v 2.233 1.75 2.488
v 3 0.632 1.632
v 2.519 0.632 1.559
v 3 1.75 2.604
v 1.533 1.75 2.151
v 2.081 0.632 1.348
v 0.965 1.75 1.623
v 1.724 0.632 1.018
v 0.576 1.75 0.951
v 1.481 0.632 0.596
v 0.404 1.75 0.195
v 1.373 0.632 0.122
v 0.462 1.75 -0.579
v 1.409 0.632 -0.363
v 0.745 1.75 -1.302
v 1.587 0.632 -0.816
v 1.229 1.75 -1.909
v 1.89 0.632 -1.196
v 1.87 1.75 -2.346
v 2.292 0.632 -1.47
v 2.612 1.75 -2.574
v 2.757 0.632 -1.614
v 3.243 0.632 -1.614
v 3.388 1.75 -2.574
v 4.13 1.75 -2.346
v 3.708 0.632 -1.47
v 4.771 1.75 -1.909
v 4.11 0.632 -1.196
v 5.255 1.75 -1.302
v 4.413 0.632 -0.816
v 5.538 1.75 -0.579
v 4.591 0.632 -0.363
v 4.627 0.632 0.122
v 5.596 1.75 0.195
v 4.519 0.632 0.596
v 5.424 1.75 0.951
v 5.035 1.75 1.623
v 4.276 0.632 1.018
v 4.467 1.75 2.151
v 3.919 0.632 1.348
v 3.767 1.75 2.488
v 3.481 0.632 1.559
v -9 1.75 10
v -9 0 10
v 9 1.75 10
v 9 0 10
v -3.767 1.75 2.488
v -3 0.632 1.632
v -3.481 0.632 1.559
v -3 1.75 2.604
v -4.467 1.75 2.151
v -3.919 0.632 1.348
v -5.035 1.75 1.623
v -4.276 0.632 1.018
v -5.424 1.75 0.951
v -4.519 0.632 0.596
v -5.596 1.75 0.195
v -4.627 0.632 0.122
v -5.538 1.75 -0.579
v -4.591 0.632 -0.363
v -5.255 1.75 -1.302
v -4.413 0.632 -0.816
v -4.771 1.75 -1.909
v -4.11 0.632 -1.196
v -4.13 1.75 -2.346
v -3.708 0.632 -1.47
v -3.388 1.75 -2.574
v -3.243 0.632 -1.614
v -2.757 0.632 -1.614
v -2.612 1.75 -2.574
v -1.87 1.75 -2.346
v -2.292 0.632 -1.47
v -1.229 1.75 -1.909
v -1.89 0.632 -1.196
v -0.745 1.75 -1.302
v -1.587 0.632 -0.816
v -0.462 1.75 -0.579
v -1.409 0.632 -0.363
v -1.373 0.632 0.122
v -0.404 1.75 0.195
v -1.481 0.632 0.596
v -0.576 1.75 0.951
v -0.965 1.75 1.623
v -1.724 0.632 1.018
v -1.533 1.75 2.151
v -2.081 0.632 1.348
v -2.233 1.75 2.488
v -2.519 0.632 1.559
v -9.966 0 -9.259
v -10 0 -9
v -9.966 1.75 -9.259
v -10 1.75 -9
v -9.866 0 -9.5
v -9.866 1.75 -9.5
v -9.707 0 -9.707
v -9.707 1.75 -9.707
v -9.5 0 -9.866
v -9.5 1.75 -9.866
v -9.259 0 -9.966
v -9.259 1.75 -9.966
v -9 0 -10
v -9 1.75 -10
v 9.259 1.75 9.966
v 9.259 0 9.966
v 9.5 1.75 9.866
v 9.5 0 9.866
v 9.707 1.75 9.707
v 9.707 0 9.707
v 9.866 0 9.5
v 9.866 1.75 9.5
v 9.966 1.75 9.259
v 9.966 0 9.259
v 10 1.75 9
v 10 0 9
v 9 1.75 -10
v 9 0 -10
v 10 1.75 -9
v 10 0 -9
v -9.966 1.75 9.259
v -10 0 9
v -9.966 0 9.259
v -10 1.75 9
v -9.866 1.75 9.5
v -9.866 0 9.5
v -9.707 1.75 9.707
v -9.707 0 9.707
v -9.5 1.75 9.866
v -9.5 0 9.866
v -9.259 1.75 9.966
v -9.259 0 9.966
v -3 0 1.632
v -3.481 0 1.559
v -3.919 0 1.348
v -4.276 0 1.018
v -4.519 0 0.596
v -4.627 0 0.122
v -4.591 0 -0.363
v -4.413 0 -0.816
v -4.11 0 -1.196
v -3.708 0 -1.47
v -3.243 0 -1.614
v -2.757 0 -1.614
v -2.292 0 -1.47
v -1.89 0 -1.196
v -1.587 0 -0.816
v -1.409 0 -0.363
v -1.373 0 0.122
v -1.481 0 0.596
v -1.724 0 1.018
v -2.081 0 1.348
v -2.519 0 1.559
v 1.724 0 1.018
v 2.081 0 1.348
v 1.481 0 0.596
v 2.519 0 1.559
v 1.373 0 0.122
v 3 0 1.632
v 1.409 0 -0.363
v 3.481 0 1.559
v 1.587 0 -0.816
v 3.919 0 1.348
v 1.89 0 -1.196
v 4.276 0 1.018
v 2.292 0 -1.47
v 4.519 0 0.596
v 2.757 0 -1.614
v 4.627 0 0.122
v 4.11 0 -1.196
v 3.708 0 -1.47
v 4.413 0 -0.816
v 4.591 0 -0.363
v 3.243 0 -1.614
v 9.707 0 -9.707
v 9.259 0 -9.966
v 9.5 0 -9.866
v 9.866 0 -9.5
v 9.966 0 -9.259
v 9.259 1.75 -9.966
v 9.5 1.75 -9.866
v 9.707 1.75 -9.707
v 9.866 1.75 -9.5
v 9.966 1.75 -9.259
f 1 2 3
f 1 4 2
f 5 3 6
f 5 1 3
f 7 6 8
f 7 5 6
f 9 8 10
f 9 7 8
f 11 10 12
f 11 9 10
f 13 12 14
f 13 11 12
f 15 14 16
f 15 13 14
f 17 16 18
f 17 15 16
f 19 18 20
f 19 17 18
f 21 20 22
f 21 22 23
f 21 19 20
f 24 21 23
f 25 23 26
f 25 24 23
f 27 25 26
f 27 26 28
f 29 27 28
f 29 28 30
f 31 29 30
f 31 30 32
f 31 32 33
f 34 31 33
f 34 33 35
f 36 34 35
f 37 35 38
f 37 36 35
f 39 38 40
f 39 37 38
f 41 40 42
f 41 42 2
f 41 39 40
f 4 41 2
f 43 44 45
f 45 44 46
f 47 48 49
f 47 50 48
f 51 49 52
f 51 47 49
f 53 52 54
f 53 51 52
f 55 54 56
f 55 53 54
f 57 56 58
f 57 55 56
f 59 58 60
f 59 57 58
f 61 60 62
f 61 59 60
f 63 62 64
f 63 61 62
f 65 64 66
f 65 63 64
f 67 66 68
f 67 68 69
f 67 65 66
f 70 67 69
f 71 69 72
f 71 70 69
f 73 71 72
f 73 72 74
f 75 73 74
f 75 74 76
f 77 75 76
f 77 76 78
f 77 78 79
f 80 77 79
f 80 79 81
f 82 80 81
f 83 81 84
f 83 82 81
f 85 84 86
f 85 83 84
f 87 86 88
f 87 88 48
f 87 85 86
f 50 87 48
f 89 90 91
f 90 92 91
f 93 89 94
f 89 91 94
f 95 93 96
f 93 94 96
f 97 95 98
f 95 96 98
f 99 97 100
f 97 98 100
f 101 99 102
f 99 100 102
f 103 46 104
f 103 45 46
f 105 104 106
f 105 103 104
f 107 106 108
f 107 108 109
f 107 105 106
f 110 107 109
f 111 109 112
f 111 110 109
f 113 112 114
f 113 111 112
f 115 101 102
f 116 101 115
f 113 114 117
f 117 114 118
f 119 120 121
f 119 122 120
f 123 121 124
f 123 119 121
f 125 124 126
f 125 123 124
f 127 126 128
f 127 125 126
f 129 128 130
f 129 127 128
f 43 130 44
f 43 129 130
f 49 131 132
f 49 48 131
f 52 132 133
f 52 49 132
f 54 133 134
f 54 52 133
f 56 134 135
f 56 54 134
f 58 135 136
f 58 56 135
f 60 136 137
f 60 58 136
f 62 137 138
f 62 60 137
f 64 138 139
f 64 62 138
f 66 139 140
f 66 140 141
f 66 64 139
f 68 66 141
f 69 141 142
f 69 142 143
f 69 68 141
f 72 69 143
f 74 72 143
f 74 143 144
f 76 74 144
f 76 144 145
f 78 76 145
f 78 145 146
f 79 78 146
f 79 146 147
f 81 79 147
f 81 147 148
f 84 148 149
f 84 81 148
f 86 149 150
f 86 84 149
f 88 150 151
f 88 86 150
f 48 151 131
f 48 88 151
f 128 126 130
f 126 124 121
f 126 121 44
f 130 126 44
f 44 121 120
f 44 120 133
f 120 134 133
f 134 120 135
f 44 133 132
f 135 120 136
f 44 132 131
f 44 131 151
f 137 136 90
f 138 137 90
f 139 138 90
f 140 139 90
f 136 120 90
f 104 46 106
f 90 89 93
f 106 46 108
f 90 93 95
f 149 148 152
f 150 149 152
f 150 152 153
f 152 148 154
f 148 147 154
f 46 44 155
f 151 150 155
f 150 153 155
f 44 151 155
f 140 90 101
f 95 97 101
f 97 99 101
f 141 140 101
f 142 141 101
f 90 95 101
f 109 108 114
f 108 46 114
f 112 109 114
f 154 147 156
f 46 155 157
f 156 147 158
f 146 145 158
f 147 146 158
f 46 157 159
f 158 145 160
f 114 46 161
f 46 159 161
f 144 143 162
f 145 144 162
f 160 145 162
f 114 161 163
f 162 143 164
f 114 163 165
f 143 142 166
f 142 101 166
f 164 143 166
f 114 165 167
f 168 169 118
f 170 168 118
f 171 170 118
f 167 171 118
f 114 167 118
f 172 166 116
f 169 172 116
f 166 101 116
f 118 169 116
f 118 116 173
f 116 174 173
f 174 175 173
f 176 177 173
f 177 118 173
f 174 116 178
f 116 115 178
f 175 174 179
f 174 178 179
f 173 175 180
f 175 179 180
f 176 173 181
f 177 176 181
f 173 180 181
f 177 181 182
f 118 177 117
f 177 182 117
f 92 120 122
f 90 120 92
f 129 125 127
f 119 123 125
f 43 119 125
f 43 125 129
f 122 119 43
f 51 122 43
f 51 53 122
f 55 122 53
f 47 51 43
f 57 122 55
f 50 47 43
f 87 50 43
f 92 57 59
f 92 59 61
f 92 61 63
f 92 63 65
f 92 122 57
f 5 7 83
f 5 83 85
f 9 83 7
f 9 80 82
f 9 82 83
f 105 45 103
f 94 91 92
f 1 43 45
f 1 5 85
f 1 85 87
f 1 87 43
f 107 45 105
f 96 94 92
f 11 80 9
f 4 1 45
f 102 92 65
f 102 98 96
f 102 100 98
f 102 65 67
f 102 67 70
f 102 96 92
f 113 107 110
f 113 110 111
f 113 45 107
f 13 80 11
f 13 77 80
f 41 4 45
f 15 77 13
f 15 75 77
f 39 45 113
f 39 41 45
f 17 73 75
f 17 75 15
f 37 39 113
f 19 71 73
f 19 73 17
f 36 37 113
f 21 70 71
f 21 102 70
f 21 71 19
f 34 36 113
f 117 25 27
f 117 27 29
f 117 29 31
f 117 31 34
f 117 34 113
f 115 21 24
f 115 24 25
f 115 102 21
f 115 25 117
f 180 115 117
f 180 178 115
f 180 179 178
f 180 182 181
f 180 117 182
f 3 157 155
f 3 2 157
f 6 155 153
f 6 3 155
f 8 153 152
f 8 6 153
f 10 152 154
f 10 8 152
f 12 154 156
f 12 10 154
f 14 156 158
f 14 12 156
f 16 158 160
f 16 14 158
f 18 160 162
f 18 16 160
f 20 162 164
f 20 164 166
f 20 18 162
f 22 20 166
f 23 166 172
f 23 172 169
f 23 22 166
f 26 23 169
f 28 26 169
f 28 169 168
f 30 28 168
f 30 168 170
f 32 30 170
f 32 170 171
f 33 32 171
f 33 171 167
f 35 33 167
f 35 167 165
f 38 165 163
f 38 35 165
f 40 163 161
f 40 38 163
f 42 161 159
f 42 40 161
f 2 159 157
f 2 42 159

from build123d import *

# Parameters (mm, degrees)
SKETCH1_W                                     = 20
SKETCH1_H                                     = 20
BOSS_EXTRUDE1_DEPTH                           = 1.75
CSK_FOR_4_FLAT_HEAD_MACHINE_SCREW1_AT_2_COUNT = 2
CSK_FOR_4_FLAT_HEAD_MACHINE_SCREW1_AT_2_PITCH = 6
FILLET2_R                                     = 1


with BuildPart() as part:
    # Sketch1 → Boss-Extrude1 (new body)
    with BuildSketch(Plane(origin=(0, 0, 0), x_dir=(1, 0, 0), z_dir=(0, 1, 0))):
        Rectangle(SKETCH1_W, SKETCH1_H)
    extrude(amount=BOSS_EXTRUDE1_DEPTH)

    # Sketch4 → CSK for #4 Flat Head Machine Screw1 (revolve, cut)
    with BuildSketch(Plane(origin=(3, 1.75, 0), x_dir=(0, 0, 1), z_dir=(1, 0, 0))):
        Polygon((0, 0), (0, 1.75), (1.63195, 1.75), (1.63195, 1.117640426), (2.6035, 0), align=None)
    csk_for_4_flat_head_machine_screw1 = revolve(axis=Axis((3, 8.1, 0), (0, -1, 0)), mode=Mode.SUBTRACT)

    # CSK for #4 Flat Head Machine Screw1 at 2: CSK for #4 Flat Head Machine Screw1 ×2
    with Locations(*[(-i * CSK_FOR_4_FLAT_HEAD_MACHINE_SCREW1_AT_2_PITCH, 0, 0) for i in range(1, CSK_FOR_4_FLAT_HEAD_MACHINE_SCREW1_AT_2_COUNT)]):
        add(csk_for_4_flat_head_machine_screw1, mode=Mode.SUBTRACT)

    # Fillet2
    fillet2_edges = [part.edges().sort_by_distance(p)[0] for p in [
        (10, 0.875, 10),
        (-10, 0.875, 10),
        (-10, 0.875, -10),
        (10, 0.875, -10),
    ]]
    fillet(fillet2_edges, radius=FILLET2_R)


solid = part.part
